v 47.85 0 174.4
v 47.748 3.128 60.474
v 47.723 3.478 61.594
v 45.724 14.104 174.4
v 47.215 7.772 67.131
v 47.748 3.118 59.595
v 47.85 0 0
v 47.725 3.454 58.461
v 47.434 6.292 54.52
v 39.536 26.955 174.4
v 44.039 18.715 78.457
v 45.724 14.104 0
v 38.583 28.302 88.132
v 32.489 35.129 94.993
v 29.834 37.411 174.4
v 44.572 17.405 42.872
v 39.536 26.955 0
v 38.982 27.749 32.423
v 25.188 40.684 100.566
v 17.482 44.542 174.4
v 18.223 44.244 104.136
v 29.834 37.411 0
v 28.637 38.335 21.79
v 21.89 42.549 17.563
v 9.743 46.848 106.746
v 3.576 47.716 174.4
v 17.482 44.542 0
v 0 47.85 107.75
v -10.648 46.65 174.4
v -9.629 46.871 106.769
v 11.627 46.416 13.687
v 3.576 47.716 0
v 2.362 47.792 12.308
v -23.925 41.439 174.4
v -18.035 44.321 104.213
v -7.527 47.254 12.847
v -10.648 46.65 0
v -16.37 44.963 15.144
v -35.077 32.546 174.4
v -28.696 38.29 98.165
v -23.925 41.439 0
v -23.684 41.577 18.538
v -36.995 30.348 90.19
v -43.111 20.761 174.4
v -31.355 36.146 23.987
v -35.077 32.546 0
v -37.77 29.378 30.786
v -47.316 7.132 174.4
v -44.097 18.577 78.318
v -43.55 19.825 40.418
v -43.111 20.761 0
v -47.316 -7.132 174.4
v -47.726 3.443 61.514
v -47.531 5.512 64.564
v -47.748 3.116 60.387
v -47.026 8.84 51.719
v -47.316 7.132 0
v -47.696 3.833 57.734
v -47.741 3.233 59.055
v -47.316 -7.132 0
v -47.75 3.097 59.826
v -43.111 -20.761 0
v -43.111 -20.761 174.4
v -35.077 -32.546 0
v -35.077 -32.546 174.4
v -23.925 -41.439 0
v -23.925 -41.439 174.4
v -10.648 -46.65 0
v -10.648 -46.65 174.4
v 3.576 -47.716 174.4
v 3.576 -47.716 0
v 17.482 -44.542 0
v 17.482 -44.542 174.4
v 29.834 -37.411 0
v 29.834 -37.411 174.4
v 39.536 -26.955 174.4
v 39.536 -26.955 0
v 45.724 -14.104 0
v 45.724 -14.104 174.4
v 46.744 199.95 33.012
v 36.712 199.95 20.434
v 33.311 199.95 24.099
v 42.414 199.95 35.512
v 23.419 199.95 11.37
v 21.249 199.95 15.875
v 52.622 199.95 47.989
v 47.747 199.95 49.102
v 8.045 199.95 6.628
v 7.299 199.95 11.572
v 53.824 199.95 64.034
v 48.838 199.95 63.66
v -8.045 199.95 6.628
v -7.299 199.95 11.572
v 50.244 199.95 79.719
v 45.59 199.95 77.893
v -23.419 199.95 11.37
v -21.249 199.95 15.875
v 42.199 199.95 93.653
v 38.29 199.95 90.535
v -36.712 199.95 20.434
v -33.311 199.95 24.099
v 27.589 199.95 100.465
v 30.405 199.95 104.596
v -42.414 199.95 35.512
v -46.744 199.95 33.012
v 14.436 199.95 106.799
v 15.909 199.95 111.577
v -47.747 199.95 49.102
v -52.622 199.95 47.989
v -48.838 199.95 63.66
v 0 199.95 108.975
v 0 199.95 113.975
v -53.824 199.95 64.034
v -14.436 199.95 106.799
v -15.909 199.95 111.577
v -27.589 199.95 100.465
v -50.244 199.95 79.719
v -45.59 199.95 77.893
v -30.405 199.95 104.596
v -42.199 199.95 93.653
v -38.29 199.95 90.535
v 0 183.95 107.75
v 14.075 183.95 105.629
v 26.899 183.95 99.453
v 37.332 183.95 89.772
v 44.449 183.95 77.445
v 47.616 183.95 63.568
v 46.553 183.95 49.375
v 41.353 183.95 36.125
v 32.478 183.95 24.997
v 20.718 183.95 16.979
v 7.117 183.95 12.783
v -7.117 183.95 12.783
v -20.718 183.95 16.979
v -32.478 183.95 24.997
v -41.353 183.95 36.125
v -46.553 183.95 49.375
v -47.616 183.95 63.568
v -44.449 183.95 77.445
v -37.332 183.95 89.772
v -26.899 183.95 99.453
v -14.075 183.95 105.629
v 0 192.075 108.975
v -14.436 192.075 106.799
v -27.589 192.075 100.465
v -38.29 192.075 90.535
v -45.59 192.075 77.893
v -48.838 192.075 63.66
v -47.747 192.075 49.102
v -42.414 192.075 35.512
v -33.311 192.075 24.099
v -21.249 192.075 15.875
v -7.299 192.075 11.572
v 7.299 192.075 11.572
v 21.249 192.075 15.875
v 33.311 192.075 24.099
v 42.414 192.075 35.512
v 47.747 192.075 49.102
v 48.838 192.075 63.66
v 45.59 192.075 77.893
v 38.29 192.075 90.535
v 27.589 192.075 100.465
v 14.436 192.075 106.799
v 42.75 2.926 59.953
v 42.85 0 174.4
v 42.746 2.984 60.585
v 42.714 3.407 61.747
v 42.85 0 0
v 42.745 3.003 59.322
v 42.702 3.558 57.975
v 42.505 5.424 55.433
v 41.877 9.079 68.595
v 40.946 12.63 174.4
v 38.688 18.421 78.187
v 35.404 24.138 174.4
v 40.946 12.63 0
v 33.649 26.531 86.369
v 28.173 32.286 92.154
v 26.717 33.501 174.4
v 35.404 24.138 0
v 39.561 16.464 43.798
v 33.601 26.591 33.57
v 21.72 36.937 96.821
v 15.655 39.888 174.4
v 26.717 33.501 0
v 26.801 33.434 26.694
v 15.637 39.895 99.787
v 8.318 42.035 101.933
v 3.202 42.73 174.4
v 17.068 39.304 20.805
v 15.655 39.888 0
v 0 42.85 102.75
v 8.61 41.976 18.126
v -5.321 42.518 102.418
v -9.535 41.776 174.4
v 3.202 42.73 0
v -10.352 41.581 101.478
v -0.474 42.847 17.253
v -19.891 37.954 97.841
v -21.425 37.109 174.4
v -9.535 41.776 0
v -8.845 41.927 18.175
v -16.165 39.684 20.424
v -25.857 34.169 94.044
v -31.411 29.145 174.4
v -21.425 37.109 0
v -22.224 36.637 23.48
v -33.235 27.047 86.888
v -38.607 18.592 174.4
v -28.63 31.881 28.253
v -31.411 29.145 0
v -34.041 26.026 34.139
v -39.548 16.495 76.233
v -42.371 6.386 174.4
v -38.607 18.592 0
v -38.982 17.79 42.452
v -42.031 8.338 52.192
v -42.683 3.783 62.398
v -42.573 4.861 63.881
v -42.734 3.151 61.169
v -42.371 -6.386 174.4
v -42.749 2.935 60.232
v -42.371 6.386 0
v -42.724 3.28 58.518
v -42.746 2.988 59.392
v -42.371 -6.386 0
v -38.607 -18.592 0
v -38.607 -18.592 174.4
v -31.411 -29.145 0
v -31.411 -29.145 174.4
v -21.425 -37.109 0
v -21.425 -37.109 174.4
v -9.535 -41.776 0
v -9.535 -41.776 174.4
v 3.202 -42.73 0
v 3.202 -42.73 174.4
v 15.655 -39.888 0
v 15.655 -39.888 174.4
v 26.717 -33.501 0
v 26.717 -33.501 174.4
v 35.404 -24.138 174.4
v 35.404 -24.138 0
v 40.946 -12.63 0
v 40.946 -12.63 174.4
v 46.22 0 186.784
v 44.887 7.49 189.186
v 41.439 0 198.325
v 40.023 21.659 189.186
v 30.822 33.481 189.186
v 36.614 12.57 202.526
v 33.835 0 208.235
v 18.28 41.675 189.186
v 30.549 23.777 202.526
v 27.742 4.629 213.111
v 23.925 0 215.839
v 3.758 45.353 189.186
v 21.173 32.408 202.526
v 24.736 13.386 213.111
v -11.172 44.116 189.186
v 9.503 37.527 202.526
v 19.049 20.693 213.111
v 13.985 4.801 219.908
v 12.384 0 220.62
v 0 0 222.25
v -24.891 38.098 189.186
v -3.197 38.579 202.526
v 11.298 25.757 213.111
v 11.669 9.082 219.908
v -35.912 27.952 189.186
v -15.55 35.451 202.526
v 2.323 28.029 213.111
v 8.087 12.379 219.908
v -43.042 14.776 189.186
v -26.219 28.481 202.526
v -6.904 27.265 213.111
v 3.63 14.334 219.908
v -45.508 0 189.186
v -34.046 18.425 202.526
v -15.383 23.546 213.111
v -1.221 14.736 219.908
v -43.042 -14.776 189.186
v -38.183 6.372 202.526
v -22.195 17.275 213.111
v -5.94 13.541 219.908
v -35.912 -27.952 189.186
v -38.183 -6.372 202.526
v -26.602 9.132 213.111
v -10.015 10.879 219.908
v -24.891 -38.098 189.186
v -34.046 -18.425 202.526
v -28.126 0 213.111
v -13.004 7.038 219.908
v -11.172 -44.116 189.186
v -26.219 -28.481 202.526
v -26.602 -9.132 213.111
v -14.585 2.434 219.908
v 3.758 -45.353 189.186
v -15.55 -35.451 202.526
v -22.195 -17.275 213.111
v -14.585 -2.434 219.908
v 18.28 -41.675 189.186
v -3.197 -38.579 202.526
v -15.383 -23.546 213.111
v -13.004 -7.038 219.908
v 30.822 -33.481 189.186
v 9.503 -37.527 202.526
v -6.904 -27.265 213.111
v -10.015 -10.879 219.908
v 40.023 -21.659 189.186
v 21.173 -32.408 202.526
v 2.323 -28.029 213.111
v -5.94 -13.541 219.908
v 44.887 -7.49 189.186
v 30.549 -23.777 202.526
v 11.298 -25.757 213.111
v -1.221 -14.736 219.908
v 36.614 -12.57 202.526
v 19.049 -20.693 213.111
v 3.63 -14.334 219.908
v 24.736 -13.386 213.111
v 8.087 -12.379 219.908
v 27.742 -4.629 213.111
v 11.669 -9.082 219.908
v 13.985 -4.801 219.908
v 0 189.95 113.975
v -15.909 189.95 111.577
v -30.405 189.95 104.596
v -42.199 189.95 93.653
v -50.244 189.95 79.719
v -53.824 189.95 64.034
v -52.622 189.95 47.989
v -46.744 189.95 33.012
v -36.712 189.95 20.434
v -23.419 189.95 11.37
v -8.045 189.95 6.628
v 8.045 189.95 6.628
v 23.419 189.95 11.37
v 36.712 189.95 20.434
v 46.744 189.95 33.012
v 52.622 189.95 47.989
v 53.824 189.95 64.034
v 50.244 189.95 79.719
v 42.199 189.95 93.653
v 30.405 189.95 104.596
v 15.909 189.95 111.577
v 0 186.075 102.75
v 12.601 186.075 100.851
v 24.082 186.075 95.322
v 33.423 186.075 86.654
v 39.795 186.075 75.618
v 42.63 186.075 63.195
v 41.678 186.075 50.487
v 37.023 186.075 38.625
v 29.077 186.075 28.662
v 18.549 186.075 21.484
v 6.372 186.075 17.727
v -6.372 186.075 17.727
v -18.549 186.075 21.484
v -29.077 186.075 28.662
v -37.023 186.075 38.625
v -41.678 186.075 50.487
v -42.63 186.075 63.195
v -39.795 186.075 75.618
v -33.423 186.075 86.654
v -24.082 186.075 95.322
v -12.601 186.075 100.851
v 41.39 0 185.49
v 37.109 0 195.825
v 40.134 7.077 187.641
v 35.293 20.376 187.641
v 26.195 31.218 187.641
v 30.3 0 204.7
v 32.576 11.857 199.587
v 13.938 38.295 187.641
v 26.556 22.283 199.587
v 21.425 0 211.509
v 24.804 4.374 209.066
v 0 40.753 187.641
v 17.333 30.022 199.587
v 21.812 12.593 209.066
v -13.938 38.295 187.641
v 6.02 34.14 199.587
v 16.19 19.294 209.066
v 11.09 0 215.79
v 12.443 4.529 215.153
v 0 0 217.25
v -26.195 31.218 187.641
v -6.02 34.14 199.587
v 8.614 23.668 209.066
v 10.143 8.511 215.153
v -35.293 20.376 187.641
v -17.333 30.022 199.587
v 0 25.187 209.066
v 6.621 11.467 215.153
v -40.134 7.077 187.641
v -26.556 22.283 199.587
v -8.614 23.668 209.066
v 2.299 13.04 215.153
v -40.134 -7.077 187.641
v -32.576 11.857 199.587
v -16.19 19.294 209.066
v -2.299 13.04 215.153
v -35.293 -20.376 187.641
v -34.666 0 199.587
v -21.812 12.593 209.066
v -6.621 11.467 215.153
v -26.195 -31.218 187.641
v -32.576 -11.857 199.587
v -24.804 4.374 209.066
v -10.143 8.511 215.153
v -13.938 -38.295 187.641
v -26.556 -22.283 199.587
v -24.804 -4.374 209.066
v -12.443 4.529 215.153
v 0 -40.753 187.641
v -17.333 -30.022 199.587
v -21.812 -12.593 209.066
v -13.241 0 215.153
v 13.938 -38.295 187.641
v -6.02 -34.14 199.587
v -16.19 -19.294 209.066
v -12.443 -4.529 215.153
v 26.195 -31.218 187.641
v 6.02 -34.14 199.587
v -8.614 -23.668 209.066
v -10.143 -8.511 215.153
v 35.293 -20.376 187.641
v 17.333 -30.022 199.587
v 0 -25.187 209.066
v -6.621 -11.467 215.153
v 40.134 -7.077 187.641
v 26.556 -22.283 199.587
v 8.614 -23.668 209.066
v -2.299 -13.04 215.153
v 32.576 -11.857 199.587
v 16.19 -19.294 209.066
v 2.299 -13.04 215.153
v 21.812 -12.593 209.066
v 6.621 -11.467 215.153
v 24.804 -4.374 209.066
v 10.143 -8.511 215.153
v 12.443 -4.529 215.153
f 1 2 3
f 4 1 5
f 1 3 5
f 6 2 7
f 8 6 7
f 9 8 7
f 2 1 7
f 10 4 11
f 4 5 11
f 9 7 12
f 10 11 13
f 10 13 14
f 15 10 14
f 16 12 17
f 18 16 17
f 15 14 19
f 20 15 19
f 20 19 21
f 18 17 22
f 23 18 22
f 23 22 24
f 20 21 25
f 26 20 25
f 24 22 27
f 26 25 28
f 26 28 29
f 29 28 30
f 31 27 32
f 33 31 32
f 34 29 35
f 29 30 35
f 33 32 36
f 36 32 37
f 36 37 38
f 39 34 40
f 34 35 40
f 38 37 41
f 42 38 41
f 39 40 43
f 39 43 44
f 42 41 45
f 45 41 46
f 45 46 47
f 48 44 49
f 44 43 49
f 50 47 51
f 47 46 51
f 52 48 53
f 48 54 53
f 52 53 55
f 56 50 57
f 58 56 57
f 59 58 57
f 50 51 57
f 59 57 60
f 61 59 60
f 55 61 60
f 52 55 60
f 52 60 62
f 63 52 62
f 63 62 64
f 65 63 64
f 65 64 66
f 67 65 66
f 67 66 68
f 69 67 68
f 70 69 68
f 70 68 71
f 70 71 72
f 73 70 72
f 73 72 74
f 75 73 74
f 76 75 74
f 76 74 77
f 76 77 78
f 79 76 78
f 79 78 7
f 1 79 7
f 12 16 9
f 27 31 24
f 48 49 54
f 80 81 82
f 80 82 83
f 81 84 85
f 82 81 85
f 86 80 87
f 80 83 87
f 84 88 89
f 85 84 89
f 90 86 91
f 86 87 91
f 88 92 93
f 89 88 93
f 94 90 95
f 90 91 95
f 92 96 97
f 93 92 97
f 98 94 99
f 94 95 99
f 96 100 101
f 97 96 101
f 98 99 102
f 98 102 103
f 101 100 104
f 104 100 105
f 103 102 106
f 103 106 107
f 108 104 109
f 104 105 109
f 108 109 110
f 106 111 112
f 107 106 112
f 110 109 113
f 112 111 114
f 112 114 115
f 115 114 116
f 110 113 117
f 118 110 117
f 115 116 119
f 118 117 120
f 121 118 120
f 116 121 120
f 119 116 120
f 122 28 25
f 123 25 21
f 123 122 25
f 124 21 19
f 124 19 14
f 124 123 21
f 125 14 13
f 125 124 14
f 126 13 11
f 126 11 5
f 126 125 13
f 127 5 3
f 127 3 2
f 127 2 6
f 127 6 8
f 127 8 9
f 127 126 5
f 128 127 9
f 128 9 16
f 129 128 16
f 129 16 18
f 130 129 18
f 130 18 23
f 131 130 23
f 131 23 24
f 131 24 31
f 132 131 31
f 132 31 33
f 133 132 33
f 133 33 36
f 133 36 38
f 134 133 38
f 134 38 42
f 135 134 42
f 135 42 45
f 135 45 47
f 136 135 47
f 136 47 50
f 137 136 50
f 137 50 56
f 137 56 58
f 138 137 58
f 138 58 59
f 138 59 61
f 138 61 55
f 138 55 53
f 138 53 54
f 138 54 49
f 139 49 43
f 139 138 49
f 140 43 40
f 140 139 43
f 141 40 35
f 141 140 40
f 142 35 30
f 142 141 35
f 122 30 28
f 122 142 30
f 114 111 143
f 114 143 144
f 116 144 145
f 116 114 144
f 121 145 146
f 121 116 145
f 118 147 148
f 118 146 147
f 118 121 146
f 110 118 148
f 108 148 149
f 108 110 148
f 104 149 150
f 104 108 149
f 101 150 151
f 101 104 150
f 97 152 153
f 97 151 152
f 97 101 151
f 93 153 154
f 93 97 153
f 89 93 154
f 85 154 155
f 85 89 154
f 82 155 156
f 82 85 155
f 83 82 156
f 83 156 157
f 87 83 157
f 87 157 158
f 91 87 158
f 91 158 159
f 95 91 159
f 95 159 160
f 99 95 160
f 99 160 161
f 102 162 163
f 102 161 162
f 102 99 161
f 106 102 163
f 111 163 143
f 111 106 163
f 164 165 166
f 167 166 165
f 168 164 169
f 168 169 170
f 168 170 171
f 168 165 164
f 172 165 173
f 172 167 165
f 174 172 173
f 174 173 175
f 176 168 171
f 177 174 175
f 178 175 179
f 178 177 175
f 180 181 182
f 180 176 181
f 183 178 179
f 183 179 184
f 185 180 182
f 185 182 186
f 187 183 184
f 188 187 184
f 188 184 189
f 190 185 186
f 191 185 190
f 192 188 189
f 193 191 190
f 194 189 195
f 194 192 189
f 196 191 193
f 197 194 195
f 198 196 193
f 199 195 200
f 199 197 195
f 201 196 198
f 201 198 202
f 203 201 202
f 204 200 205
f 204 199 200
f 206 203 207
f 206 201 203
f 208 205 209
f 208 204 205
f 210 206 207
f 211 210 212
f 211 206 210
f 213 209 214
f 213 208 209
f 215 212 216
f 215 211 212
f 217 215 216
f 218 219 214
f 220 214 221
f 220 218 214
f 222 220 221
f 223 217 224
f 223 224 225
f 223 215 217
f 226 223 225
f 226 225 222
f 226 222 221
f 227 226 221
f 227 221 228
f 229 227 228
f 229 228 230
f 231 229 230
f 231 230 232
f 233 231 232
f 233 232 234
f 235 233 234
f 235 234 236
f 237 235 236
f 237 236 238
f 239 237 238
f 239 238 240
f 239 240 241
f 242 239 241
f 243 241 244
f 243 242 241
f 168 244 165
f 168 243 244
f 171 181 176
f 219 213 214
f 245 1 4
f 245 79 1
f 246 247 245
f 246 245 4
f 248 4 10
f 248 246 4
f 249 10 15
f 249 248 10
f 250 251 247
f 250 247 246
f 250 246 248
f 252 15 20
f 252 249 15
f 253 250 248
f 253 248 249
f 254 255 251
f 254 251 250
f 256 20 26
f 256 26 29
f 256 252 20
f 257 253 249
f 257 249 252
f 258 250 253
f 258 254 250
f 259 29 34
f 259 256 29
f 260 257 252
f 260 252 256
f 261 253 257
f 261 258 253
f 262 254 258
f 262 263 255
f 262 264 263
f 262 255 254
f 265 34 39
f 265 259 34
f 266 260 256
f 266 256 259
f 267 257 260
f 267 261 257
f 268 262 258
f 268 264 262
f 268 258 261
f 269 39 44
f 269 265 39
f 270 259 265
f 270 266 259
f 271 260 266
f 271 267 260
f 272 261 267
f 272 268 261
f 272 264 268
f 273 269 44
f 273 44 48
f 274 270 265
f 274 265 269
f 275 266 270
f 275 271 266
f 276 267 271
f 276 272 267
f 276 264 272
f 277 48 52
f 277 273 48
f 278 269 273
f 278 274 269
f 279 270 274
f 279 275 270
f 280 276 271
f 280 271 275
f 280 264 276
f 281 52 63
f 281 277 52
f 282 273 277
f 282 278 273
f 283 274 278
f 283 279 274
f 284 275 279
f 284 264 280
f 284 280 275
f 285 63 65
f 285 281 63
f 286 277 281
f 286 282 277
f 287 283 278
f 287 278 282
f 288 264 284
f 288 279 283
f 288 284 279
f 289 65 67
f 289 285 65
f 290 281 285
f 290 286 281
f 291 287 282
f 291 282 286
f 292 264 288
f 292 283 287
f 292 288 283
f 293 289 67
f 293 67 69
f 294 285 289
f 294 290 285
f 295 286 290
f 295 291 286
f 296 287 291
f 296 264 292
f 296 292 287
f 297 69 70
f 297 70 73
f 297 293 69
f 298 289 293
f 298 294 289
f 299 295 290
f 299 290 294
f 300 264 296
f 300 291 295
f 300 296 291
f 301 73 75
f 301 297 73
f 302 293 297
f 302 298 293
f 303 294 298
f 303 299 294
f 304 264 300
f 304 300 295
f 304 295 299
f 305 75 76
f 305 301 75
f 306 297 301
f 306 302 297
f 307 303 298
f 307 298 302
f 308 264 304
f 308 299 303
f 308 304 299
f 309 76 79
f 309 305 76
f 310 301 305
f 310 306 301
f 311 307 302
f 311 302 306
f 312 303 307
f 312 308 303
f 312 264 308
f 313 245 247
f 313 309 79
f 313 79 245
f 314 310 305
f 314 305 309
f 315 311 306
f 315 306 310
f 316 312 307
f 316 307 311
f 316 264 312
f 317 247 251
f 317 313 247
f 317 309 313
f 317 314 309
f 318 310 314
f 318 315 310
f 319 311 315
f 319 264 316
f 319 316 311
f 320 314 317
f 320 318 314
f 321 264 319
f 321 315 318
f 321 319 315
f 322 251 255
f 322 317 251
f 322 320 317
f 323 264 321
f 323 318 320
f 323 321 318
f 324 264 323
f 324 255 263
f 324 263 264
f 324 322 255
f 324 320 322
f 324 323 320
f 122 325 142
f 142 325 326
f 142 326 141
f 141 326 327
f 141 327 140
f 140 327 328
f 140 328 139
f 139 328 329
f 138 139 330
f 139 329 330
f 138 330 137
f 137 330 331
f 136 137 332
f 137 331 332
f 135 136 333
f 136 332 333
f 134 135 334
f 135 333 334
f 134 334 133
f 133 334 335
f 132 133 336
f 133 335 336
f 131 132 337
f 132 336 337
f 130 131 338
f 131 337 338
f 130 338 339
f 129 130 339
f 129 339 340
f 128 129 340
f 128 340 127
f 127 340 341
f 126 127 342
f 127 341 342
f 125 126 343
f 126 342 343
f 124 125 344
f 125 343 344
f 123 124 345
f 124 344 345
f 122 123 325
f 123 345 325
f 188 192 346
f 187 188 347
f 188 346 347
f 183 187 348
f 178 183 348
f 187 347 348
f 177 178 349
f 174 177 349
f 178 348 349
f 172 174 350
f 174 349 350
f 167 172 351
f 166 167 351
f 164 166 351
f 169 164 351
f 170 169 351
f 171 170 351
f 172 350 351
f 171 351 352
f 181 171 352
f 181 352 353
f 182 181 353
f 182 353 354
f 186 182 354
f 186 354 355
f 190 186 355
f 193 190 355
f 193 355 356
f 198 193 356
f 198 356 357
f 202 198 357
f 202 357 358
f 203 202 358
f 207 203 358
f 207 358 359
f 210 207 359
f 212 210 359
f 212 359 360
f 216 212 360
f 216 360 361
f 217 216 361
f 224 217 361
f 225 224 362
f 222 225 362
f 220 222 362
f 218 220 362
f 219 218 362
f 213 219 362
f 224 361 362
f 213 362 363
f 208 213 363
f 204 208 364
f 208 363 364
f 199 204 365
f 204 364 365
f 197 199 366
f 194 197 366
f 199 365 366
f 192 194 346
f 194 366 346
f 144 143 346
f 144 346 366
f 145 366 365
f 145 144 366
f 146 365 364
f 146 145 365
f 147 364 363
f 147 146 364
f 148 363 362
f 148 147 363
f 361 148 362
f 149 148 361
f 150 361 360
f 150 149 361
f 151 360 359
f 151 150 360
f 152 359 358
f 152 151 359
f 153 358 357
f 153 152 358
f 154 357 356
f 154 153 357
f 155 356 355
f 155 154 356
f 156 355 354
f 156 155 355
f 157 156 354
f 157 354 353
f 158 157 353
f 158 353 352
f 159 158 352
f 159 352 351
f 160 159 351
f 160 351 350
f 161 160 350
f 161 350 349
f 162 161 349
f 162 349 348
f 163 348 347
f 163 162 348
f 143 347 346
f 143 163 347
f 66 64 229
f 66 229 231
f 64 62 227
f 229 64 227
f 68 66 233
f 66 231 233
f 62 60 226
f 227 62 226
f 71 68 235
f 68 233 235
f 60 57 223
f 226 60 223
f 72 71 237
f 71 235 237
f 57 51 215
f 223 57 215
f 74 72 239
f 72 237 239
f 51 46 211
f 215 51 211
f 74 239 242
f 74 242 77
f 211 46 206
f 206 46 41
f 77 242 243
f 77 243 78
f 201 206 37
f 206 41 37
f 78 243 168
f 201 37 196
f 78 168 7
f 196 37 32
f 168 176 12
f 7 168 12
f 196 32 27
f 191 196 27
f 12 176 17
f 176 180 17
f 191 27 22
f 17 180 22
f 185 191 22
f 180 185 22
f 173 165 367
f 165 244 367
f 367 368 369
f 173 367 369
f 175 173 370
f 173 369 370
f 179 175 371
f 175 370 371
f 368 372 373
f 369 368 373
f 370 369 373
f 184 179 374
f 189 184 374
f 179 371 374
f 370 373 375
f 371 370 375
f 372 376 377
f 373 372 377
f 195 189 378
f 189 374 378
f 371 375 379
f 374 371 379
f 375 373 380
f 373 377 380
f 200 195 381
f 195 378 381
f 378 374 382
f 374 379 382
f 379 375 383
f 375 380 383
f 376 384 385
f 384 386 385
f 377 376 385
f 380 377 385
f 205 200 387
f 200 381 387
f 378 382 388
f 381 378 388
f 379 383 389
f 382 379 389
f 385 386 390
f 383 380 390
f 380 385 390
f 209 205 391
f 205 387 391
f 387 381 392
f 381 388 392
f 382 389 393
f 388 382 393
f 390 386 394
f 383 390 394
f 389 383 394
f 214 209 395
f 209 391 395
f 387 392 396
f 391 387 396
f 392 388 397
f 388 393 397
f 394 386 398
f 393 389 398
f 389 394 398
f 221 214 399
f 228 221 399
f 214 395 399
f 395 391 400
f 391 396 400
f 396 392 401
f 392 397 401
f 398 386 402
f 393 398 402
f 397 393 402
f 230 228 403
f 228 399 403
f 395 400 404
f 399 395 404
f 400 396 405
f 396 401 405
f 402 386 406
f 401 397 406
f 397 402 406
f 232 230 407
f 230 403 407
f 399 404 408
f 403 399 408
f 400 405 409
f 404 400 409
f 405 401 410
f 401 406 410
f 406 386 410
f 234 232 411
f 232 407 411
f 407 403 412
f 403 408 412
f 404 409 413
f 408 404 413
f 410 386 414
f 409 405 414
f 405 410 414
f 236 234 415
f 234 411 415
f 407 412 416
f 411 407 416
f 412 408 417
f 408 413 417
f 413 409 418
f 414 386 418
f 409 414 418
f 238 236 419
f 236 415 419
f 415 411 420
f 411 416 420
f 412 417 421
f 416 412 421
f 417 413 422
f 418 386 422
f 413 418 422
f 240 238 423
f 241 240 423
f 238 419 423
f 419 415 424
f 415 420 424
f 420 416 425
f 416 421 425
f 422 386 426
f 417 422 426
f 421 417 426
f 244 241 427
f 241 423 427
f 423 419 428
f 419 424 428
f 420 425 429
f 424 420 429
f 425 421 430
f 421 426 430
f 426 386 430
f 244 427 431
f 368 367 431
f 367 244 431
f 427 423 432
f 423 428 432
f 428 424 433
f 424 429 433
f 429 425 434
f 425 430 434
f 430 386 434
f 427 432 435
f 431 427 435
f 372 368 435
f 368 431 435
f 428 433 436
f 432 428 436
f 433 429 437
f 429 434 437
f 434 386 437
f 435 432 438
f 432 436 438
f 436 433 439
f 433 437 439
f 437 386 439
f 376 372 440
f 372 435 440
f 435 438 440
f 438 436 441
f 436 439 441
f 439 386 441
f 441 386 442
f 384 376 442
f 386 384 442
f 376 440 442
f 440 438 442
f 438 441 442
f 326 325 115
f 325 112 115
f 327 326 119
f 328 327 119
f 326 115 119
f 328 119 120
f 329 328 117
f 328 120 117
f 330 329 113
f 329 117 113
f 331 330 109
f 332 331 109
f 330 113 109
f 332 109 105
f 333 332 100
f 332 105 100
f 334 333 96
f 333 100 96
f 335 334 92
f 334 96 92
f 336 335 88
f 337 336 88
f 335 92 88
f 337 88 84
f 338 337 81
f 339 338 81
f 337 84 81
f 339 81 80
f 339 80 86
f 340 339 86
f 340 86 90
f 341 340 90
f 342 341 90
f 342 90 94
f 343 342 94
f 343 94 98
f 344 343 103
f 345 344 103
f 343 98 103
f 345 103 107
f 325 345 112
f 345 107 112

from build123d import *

# Parameters (mm, degrees)
SKETCH1_R           = 47.85
BOSS_EXTRUDE1_DEPTH = 222.25
SKETCH2_R           = 47.75
BOSS_EXTRUDE2_DEPTH = 183.95
FILLET1_R           = 47.85
SHELL1_T            = -5


with BuildPart() as part:
    # Sketch1 → Boss-Extrude1 (new body)
    with BuildSketch(Plane.XY):
        Circle(SKETCH1_R)
    extrude(amount=BOSS_EXTRUDE1_DEPTH)

    # Sketch2 → Boss-Extrude2 (add)
    with BuildSketch(Plane(origin=(0, 183.95, 0), x_dir=(1, 0, 0), z_dir=(0, 1, 0))):
        with Locations(Location((0, -60, 0), (0, 0, 270))):
            Circle(SKETCH2_R)
    extrude(amount=-BOSS_EXTRUDE2_DEPTH)

    # Sketch5 → Revolve3 (revolve)
    with BuildSketch(Plane(origin=(0, 0, 0), x_dir=(0, 0, -1), z_dir=(1, 0, 0)), mode=Mode.PRIVATE) as revolve3_sk:
        Polygon((-60, 183.95), (-12.25, 183.95), (-6.025, 189.95), (-6.025, 199.95), (-60, 199.95), align=None)
    revolve(revolve3_sk.sketch.rotate(Axis((0, 199.95, 60), (0, -1, 0)), 180), axis=Axis((0, 199.95, 60), (0, -1, 0)))

    # Fillet1
    fillet1_edges = [part.edges().sort_by_distance(p)[0] for p in [
        (-47.85, 0, 222.25),
    ]]
    fillet(fillet1_edges, radius=FILLET1_R)

    # Shell1
    shell1_openings = [part.faces().sort_by_distance(p)[0] for p in [
        (0, 199.95, 60),
        (0, 0, 0),
    ]]
    offset(amount=SHELL1_T, openings=shell1_openings, kind=Kind.INTERSECTION)


solid = part.part
